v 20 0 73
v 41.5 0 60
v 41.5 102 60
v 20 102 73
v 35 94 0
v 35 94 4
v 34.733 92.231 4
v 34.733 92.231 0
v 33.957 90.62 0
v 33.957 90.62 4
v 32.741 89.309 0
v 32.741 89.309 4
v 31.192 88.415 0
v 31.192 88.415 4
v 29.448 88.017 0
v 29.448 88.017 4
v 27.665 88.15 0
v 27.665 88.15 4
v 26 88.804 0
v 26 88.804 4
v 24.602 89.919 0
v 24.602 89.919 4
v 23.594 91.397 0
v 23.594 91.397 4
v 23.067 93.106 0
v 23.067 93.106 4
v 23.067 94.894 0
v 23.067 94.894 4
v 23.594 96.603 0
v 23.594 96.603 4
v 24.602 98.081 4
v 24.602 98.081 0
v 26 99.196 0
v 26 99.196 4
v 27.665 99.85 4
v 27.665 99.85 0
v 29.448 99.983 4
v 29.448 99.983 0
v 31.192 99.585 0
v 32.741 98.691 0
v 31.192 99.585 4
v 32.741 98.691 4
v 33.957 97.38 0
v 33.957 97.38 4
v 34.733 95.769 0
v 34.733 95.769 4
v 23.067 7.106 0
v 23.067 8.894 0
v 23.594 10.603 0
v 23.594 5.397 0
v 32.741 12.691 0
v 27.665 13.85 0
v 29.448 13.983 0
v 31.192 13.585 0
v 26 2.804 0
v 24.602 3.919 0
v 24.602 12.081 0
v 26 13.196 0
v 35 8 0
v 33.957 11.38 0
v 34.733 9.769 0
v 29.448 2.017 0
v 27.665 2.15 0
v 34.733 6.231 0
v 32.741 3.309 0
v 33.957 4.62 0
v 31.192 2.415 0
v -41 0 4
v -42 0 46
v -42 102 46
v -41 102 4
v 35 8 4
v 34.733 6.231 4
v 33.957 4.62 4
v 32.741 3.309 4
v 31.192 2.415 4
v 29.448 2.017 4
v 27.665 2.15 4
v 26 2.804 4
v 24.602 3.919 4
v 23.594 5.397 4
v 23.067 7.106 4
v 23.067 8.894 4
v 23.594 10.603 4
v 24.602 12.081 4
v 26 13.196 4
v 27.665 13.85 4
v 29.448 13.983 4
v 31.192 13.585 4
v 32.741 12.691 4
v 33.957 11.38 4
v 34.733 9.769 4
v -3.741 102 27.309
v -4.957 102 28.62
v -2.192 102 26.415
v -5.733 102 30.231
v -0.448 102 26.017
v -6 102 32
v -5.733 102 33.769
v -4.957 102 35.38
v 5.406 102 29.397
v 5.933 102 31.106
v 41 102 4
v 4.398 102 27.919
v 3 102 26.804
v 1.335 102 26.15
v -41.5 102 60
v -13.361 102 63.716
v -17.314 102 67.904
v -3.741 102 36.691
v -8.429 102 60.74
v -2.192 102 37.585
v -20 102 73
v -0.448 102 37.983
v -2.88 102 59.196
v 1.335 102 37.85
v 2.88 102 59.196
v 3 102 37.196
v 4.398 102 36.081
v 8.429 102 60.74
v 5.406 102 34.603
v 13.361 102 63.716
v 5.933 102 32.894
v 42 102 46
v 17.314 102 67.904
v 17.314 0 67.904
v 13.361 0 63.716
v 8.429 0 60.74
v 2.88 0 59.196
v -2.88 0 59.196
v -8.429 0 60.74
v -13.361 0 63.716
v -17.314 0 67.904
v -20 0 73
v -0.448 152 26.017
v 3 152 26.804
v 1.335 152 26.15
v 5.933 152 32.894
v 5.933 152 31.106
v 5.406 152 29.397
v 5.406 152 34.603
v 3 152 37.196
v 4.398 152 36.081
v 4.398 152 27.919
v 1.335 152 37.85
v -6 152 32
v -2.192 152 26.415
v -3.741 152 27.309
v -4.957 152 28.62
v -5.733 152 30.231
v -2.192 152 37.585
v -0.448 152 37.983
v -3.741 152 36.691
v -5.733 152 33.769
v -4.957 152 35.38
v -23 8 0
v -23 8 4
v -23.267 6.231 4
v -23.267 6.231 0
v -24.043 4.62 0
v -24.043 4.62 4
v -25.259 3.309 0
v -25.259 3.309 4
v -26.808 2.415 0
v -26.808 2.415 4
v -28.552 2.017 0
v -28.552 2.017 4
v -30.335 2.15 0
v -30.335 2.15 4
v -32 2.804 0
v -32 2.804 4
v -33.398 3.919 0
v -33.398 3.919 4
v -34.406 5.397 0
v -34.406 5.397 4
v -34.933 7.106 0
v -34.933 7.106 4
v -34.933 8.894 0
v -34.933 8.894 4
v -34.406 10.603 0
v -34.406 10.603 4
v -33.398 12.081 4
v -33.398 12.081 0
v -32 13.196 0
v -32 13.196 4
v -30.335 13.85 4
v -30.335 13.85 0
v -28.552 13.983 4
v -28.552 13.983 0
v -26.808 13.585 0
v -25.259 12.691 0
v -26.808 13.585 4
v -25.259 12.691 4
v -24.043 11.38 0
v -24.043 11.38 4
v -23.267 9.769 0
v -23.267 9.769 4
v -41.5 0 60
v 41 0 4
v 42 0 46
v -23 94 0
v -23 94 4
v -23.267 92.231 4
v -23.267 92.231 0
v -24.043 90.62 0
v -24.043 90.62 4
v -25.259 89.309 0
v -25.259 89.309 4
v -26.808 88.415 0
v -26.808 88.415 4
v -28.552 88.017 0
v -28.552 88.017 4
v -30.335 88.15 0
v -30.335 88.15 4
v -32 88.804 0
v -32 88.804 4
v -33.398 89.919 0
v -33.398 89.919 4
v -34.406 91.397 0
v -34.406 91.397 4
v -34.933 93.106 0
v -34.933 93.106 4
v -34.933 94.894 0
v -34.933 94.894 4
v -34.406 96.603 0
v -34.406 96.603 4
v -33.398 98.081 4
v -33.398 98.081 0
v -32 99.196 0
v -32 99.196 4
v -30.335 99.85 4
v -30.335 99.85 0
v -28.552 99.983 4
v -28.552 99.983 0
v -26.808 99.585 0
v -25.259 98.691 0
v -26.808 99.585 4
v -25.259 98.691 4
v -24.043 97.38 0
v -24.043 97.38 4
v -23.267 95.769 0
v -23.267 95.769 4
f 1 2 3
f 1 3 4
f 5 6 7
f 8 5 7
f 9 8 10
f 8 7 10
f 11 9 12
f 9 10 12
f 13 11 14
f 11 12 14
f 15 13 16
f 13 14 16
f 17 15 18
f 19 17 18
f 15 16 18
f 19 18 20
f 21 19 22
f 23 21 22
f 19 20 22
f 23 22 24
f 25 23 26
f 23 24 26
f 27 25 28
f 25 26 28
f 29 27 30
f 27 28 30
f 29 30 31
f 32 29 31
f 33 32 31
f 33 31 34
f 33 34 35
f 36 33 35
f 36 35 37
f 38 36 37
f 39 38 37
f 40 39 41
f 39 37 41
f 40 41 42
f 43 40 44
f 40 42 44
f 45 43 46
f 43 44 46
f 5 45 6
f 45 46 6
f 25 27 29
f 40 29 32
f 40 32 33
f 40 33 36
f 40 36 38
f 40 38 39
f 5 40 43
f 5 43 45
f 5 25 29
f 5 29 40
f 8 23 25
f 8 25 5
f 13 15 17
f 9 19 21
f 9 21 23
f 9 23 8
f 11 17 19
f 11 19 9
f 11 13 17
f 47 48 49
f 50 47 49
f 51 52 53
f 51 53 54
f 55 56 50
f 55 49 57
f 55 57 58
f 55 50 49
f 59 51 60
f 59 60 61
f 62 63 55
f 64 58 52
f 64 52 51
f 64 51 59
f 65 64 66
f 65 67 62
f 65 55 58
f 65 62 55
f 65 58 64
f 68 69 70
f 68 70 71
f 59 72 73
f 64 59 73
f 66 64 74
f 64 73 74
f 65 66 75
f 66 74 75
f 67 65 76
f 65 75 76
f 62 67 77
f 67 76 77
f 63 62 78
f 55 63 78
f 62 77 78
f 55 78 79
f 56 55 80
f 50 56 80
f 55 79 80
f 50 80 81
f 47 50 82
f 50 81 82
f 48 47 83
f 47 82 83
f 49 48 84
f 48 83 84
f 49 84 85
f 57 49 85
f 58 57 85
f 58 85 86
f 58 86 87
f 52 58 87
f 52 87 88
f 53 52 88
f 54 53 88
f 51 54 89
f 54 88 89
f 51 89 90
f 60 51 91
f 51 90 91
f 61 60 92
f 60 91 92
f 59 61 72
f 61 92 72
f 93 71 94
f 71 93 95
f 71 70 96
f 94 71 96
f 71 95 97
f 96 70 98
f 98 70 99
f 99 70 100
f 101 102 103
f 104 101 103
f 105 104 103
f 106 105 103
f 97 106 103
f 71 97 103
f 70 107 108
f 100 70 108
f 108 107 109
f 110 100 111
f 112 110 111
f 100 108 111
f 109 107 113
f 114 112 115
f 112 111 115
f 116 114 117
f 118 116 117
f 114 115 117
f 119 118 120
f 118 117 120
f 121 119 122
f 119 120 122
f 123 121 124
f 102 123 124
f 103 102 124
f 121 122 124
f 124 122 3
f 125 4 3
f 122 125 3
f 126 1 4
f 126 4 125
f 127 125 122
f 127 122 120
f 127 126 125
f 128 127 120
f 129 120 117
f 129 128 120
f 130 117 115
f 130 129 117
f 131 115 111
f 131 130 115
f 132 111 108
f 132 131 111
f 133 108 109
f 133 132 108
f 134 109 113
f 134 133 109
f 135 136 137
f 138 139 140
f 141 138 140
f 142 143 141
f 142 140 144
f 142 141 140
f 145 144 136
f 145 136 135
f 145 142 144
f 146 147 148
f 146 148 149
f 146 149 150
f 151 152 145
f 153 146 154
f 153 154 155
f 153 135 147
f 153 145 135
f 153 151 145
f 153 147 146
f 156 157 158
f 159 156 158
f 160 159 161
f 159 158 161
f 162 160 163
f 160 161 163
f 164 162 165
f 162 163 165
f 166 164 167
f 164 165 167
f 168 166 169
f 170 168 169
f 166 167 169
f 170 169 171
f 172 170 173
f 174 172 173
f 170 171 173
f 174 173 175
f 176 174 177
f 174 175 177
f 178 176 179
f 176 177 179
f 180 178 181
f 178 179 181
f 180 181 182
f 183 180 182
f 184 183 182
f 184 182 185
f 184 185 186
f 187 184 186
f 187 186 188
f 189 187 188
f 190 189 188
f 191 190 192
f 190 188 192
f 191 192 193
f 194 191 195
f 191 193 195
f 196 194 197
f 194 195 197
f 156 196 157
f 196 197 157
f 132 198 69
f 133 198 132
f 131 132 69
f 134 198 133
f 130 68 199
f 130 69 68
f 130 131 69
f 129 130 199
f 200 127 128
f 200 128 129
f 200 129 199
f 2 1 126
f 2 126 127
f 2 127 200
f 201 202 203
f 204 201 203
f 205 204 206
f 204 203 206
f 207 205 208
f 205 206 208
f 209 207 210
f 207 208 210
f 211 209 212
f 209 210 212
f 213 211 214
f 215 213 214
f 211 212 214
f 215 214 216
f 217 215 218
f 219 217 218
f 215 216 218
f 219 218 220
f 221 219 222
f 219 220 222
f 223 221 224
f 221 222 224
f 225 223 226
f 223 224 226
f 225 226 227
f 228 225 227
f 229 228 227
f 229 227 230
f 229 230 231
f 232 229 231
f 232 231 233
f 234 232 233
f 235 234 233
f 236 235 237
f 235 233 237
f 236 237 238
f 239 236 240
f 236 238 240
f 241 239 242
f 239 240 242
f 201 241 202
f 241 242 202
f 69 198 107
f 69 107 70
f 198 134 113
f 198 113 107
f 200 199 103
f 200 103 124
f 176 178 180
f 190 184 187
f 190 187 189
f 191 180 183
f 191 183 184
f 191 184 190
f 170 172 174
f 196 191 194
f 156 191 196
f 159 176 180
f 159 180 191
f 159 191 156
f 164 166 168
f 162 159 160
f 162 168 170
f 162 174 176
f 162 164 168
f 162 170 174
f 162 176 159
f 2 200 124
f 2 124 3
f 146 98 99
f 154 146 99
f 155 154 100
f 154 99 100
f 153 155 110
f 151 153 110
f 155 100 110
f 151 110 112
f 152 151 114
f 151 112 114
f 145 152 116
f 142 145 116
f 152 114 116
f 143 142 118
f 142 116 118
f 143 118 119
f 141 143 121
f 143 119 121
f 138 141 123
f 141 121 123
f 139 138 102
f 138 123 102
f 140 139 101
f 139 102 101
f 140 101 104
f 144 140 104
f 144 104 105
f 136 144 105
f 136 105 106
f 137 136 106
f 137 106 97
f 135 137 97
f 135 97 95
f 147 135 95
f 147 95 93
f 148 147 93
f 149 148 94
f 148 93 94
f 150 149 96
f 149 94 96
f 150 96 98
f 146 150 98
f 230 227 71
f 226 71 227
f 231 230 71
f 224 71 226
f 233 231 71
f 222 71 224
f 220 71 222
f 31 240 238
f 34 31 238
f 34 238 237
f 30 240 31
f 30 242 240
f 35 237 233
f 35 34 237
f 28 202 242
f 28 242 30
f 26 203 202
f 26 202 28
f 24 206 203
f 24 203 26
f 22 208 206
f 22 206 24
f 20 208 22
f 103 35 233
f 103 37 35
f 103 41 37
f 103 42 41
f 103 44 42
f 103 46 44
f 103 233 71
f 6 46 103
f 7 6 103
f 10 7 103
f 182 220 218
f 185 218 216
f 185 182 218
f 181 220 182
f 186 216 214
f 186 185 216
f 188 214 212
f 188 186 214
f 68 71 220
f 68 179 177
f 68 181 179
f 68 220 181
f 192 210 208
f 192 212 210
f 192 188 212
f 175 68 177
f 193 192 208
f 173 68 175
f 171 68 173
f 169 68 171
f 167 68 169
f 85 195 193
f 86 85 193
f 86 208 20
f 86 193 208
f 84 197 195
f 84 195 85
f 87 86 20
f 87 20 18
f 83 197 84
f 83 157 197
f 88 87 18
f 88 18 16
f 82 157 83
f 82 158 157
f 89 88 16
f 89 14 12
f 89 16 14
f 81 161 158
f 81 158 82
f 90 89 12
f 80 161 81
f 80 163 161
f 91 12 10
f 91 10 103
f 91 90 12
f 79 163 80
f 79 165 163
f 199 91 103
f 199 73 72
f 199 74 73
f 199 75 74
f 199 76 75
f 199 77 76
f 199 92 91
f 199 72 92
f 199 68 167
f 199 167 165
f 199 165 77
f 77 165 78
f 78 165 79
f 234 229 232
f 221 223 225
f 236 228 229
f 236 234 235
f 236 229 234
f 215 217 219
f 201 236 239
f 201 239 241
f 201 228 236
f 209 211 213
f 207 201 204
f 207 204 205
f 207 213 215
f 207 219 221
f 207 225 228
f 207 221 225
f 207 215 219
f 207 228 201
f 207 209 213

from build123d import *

# Parameters (mm, degrees)
F1_DEPTH = 102
F2_R     = 6
F3_DEPTH = 50
F4_R     = 6
F5_DEPTH = 4


with BuildPart() as f1:
    # F0 (on Front) → F1 (new body)
    with BuildSketch(Plane.XZ):
        with BuildLine():
            Line((-41, 4), (0, 4))
            Line((0, 4), (41, 4))
            Line((41, 4), (42, 46))
            Line((42, 46), (41.5, 60))
            Line((41.5, 60), (20, 73))
            ThreePointArc((20, 73), (0, 59), (-20, 73))
            Line((-20, 73), (-41.5, 60))
            Line((-41.5, 60), (-42, 46))
            Line((-42, 46), (-41, 4))
        make_face()
    extrude(amount=-F1_DEPTH)

    # F2 (on face) → F3 (join)
    with BuildSketch(Plane(origin=(0, 102, 0), x_dir=(-1, 0, 0), z_dir=(0, 1, 0))):
        with Locations((0, 32)):
            Circle(F2_R)
    extrude(amount=F3_DEPTH)

    # F4 (on face) → F5 (join)
    with BuildSketch(Plane(origin=(0, 0, 4), x_dir=(1, 0, 0), z_dir=(0, 0, -1))):
        with Locations((29, -94)):
            Circle(F4_R)
        with Locations((-29, -94)):
            Circle(F4_R)
        with Locations((-29, -8)):
            Circle(F4_R)
        with Locations((29, -8)):
            Circle(F4_R)
    extrude(amount=F5_DEPTH)


solid = f1.part
